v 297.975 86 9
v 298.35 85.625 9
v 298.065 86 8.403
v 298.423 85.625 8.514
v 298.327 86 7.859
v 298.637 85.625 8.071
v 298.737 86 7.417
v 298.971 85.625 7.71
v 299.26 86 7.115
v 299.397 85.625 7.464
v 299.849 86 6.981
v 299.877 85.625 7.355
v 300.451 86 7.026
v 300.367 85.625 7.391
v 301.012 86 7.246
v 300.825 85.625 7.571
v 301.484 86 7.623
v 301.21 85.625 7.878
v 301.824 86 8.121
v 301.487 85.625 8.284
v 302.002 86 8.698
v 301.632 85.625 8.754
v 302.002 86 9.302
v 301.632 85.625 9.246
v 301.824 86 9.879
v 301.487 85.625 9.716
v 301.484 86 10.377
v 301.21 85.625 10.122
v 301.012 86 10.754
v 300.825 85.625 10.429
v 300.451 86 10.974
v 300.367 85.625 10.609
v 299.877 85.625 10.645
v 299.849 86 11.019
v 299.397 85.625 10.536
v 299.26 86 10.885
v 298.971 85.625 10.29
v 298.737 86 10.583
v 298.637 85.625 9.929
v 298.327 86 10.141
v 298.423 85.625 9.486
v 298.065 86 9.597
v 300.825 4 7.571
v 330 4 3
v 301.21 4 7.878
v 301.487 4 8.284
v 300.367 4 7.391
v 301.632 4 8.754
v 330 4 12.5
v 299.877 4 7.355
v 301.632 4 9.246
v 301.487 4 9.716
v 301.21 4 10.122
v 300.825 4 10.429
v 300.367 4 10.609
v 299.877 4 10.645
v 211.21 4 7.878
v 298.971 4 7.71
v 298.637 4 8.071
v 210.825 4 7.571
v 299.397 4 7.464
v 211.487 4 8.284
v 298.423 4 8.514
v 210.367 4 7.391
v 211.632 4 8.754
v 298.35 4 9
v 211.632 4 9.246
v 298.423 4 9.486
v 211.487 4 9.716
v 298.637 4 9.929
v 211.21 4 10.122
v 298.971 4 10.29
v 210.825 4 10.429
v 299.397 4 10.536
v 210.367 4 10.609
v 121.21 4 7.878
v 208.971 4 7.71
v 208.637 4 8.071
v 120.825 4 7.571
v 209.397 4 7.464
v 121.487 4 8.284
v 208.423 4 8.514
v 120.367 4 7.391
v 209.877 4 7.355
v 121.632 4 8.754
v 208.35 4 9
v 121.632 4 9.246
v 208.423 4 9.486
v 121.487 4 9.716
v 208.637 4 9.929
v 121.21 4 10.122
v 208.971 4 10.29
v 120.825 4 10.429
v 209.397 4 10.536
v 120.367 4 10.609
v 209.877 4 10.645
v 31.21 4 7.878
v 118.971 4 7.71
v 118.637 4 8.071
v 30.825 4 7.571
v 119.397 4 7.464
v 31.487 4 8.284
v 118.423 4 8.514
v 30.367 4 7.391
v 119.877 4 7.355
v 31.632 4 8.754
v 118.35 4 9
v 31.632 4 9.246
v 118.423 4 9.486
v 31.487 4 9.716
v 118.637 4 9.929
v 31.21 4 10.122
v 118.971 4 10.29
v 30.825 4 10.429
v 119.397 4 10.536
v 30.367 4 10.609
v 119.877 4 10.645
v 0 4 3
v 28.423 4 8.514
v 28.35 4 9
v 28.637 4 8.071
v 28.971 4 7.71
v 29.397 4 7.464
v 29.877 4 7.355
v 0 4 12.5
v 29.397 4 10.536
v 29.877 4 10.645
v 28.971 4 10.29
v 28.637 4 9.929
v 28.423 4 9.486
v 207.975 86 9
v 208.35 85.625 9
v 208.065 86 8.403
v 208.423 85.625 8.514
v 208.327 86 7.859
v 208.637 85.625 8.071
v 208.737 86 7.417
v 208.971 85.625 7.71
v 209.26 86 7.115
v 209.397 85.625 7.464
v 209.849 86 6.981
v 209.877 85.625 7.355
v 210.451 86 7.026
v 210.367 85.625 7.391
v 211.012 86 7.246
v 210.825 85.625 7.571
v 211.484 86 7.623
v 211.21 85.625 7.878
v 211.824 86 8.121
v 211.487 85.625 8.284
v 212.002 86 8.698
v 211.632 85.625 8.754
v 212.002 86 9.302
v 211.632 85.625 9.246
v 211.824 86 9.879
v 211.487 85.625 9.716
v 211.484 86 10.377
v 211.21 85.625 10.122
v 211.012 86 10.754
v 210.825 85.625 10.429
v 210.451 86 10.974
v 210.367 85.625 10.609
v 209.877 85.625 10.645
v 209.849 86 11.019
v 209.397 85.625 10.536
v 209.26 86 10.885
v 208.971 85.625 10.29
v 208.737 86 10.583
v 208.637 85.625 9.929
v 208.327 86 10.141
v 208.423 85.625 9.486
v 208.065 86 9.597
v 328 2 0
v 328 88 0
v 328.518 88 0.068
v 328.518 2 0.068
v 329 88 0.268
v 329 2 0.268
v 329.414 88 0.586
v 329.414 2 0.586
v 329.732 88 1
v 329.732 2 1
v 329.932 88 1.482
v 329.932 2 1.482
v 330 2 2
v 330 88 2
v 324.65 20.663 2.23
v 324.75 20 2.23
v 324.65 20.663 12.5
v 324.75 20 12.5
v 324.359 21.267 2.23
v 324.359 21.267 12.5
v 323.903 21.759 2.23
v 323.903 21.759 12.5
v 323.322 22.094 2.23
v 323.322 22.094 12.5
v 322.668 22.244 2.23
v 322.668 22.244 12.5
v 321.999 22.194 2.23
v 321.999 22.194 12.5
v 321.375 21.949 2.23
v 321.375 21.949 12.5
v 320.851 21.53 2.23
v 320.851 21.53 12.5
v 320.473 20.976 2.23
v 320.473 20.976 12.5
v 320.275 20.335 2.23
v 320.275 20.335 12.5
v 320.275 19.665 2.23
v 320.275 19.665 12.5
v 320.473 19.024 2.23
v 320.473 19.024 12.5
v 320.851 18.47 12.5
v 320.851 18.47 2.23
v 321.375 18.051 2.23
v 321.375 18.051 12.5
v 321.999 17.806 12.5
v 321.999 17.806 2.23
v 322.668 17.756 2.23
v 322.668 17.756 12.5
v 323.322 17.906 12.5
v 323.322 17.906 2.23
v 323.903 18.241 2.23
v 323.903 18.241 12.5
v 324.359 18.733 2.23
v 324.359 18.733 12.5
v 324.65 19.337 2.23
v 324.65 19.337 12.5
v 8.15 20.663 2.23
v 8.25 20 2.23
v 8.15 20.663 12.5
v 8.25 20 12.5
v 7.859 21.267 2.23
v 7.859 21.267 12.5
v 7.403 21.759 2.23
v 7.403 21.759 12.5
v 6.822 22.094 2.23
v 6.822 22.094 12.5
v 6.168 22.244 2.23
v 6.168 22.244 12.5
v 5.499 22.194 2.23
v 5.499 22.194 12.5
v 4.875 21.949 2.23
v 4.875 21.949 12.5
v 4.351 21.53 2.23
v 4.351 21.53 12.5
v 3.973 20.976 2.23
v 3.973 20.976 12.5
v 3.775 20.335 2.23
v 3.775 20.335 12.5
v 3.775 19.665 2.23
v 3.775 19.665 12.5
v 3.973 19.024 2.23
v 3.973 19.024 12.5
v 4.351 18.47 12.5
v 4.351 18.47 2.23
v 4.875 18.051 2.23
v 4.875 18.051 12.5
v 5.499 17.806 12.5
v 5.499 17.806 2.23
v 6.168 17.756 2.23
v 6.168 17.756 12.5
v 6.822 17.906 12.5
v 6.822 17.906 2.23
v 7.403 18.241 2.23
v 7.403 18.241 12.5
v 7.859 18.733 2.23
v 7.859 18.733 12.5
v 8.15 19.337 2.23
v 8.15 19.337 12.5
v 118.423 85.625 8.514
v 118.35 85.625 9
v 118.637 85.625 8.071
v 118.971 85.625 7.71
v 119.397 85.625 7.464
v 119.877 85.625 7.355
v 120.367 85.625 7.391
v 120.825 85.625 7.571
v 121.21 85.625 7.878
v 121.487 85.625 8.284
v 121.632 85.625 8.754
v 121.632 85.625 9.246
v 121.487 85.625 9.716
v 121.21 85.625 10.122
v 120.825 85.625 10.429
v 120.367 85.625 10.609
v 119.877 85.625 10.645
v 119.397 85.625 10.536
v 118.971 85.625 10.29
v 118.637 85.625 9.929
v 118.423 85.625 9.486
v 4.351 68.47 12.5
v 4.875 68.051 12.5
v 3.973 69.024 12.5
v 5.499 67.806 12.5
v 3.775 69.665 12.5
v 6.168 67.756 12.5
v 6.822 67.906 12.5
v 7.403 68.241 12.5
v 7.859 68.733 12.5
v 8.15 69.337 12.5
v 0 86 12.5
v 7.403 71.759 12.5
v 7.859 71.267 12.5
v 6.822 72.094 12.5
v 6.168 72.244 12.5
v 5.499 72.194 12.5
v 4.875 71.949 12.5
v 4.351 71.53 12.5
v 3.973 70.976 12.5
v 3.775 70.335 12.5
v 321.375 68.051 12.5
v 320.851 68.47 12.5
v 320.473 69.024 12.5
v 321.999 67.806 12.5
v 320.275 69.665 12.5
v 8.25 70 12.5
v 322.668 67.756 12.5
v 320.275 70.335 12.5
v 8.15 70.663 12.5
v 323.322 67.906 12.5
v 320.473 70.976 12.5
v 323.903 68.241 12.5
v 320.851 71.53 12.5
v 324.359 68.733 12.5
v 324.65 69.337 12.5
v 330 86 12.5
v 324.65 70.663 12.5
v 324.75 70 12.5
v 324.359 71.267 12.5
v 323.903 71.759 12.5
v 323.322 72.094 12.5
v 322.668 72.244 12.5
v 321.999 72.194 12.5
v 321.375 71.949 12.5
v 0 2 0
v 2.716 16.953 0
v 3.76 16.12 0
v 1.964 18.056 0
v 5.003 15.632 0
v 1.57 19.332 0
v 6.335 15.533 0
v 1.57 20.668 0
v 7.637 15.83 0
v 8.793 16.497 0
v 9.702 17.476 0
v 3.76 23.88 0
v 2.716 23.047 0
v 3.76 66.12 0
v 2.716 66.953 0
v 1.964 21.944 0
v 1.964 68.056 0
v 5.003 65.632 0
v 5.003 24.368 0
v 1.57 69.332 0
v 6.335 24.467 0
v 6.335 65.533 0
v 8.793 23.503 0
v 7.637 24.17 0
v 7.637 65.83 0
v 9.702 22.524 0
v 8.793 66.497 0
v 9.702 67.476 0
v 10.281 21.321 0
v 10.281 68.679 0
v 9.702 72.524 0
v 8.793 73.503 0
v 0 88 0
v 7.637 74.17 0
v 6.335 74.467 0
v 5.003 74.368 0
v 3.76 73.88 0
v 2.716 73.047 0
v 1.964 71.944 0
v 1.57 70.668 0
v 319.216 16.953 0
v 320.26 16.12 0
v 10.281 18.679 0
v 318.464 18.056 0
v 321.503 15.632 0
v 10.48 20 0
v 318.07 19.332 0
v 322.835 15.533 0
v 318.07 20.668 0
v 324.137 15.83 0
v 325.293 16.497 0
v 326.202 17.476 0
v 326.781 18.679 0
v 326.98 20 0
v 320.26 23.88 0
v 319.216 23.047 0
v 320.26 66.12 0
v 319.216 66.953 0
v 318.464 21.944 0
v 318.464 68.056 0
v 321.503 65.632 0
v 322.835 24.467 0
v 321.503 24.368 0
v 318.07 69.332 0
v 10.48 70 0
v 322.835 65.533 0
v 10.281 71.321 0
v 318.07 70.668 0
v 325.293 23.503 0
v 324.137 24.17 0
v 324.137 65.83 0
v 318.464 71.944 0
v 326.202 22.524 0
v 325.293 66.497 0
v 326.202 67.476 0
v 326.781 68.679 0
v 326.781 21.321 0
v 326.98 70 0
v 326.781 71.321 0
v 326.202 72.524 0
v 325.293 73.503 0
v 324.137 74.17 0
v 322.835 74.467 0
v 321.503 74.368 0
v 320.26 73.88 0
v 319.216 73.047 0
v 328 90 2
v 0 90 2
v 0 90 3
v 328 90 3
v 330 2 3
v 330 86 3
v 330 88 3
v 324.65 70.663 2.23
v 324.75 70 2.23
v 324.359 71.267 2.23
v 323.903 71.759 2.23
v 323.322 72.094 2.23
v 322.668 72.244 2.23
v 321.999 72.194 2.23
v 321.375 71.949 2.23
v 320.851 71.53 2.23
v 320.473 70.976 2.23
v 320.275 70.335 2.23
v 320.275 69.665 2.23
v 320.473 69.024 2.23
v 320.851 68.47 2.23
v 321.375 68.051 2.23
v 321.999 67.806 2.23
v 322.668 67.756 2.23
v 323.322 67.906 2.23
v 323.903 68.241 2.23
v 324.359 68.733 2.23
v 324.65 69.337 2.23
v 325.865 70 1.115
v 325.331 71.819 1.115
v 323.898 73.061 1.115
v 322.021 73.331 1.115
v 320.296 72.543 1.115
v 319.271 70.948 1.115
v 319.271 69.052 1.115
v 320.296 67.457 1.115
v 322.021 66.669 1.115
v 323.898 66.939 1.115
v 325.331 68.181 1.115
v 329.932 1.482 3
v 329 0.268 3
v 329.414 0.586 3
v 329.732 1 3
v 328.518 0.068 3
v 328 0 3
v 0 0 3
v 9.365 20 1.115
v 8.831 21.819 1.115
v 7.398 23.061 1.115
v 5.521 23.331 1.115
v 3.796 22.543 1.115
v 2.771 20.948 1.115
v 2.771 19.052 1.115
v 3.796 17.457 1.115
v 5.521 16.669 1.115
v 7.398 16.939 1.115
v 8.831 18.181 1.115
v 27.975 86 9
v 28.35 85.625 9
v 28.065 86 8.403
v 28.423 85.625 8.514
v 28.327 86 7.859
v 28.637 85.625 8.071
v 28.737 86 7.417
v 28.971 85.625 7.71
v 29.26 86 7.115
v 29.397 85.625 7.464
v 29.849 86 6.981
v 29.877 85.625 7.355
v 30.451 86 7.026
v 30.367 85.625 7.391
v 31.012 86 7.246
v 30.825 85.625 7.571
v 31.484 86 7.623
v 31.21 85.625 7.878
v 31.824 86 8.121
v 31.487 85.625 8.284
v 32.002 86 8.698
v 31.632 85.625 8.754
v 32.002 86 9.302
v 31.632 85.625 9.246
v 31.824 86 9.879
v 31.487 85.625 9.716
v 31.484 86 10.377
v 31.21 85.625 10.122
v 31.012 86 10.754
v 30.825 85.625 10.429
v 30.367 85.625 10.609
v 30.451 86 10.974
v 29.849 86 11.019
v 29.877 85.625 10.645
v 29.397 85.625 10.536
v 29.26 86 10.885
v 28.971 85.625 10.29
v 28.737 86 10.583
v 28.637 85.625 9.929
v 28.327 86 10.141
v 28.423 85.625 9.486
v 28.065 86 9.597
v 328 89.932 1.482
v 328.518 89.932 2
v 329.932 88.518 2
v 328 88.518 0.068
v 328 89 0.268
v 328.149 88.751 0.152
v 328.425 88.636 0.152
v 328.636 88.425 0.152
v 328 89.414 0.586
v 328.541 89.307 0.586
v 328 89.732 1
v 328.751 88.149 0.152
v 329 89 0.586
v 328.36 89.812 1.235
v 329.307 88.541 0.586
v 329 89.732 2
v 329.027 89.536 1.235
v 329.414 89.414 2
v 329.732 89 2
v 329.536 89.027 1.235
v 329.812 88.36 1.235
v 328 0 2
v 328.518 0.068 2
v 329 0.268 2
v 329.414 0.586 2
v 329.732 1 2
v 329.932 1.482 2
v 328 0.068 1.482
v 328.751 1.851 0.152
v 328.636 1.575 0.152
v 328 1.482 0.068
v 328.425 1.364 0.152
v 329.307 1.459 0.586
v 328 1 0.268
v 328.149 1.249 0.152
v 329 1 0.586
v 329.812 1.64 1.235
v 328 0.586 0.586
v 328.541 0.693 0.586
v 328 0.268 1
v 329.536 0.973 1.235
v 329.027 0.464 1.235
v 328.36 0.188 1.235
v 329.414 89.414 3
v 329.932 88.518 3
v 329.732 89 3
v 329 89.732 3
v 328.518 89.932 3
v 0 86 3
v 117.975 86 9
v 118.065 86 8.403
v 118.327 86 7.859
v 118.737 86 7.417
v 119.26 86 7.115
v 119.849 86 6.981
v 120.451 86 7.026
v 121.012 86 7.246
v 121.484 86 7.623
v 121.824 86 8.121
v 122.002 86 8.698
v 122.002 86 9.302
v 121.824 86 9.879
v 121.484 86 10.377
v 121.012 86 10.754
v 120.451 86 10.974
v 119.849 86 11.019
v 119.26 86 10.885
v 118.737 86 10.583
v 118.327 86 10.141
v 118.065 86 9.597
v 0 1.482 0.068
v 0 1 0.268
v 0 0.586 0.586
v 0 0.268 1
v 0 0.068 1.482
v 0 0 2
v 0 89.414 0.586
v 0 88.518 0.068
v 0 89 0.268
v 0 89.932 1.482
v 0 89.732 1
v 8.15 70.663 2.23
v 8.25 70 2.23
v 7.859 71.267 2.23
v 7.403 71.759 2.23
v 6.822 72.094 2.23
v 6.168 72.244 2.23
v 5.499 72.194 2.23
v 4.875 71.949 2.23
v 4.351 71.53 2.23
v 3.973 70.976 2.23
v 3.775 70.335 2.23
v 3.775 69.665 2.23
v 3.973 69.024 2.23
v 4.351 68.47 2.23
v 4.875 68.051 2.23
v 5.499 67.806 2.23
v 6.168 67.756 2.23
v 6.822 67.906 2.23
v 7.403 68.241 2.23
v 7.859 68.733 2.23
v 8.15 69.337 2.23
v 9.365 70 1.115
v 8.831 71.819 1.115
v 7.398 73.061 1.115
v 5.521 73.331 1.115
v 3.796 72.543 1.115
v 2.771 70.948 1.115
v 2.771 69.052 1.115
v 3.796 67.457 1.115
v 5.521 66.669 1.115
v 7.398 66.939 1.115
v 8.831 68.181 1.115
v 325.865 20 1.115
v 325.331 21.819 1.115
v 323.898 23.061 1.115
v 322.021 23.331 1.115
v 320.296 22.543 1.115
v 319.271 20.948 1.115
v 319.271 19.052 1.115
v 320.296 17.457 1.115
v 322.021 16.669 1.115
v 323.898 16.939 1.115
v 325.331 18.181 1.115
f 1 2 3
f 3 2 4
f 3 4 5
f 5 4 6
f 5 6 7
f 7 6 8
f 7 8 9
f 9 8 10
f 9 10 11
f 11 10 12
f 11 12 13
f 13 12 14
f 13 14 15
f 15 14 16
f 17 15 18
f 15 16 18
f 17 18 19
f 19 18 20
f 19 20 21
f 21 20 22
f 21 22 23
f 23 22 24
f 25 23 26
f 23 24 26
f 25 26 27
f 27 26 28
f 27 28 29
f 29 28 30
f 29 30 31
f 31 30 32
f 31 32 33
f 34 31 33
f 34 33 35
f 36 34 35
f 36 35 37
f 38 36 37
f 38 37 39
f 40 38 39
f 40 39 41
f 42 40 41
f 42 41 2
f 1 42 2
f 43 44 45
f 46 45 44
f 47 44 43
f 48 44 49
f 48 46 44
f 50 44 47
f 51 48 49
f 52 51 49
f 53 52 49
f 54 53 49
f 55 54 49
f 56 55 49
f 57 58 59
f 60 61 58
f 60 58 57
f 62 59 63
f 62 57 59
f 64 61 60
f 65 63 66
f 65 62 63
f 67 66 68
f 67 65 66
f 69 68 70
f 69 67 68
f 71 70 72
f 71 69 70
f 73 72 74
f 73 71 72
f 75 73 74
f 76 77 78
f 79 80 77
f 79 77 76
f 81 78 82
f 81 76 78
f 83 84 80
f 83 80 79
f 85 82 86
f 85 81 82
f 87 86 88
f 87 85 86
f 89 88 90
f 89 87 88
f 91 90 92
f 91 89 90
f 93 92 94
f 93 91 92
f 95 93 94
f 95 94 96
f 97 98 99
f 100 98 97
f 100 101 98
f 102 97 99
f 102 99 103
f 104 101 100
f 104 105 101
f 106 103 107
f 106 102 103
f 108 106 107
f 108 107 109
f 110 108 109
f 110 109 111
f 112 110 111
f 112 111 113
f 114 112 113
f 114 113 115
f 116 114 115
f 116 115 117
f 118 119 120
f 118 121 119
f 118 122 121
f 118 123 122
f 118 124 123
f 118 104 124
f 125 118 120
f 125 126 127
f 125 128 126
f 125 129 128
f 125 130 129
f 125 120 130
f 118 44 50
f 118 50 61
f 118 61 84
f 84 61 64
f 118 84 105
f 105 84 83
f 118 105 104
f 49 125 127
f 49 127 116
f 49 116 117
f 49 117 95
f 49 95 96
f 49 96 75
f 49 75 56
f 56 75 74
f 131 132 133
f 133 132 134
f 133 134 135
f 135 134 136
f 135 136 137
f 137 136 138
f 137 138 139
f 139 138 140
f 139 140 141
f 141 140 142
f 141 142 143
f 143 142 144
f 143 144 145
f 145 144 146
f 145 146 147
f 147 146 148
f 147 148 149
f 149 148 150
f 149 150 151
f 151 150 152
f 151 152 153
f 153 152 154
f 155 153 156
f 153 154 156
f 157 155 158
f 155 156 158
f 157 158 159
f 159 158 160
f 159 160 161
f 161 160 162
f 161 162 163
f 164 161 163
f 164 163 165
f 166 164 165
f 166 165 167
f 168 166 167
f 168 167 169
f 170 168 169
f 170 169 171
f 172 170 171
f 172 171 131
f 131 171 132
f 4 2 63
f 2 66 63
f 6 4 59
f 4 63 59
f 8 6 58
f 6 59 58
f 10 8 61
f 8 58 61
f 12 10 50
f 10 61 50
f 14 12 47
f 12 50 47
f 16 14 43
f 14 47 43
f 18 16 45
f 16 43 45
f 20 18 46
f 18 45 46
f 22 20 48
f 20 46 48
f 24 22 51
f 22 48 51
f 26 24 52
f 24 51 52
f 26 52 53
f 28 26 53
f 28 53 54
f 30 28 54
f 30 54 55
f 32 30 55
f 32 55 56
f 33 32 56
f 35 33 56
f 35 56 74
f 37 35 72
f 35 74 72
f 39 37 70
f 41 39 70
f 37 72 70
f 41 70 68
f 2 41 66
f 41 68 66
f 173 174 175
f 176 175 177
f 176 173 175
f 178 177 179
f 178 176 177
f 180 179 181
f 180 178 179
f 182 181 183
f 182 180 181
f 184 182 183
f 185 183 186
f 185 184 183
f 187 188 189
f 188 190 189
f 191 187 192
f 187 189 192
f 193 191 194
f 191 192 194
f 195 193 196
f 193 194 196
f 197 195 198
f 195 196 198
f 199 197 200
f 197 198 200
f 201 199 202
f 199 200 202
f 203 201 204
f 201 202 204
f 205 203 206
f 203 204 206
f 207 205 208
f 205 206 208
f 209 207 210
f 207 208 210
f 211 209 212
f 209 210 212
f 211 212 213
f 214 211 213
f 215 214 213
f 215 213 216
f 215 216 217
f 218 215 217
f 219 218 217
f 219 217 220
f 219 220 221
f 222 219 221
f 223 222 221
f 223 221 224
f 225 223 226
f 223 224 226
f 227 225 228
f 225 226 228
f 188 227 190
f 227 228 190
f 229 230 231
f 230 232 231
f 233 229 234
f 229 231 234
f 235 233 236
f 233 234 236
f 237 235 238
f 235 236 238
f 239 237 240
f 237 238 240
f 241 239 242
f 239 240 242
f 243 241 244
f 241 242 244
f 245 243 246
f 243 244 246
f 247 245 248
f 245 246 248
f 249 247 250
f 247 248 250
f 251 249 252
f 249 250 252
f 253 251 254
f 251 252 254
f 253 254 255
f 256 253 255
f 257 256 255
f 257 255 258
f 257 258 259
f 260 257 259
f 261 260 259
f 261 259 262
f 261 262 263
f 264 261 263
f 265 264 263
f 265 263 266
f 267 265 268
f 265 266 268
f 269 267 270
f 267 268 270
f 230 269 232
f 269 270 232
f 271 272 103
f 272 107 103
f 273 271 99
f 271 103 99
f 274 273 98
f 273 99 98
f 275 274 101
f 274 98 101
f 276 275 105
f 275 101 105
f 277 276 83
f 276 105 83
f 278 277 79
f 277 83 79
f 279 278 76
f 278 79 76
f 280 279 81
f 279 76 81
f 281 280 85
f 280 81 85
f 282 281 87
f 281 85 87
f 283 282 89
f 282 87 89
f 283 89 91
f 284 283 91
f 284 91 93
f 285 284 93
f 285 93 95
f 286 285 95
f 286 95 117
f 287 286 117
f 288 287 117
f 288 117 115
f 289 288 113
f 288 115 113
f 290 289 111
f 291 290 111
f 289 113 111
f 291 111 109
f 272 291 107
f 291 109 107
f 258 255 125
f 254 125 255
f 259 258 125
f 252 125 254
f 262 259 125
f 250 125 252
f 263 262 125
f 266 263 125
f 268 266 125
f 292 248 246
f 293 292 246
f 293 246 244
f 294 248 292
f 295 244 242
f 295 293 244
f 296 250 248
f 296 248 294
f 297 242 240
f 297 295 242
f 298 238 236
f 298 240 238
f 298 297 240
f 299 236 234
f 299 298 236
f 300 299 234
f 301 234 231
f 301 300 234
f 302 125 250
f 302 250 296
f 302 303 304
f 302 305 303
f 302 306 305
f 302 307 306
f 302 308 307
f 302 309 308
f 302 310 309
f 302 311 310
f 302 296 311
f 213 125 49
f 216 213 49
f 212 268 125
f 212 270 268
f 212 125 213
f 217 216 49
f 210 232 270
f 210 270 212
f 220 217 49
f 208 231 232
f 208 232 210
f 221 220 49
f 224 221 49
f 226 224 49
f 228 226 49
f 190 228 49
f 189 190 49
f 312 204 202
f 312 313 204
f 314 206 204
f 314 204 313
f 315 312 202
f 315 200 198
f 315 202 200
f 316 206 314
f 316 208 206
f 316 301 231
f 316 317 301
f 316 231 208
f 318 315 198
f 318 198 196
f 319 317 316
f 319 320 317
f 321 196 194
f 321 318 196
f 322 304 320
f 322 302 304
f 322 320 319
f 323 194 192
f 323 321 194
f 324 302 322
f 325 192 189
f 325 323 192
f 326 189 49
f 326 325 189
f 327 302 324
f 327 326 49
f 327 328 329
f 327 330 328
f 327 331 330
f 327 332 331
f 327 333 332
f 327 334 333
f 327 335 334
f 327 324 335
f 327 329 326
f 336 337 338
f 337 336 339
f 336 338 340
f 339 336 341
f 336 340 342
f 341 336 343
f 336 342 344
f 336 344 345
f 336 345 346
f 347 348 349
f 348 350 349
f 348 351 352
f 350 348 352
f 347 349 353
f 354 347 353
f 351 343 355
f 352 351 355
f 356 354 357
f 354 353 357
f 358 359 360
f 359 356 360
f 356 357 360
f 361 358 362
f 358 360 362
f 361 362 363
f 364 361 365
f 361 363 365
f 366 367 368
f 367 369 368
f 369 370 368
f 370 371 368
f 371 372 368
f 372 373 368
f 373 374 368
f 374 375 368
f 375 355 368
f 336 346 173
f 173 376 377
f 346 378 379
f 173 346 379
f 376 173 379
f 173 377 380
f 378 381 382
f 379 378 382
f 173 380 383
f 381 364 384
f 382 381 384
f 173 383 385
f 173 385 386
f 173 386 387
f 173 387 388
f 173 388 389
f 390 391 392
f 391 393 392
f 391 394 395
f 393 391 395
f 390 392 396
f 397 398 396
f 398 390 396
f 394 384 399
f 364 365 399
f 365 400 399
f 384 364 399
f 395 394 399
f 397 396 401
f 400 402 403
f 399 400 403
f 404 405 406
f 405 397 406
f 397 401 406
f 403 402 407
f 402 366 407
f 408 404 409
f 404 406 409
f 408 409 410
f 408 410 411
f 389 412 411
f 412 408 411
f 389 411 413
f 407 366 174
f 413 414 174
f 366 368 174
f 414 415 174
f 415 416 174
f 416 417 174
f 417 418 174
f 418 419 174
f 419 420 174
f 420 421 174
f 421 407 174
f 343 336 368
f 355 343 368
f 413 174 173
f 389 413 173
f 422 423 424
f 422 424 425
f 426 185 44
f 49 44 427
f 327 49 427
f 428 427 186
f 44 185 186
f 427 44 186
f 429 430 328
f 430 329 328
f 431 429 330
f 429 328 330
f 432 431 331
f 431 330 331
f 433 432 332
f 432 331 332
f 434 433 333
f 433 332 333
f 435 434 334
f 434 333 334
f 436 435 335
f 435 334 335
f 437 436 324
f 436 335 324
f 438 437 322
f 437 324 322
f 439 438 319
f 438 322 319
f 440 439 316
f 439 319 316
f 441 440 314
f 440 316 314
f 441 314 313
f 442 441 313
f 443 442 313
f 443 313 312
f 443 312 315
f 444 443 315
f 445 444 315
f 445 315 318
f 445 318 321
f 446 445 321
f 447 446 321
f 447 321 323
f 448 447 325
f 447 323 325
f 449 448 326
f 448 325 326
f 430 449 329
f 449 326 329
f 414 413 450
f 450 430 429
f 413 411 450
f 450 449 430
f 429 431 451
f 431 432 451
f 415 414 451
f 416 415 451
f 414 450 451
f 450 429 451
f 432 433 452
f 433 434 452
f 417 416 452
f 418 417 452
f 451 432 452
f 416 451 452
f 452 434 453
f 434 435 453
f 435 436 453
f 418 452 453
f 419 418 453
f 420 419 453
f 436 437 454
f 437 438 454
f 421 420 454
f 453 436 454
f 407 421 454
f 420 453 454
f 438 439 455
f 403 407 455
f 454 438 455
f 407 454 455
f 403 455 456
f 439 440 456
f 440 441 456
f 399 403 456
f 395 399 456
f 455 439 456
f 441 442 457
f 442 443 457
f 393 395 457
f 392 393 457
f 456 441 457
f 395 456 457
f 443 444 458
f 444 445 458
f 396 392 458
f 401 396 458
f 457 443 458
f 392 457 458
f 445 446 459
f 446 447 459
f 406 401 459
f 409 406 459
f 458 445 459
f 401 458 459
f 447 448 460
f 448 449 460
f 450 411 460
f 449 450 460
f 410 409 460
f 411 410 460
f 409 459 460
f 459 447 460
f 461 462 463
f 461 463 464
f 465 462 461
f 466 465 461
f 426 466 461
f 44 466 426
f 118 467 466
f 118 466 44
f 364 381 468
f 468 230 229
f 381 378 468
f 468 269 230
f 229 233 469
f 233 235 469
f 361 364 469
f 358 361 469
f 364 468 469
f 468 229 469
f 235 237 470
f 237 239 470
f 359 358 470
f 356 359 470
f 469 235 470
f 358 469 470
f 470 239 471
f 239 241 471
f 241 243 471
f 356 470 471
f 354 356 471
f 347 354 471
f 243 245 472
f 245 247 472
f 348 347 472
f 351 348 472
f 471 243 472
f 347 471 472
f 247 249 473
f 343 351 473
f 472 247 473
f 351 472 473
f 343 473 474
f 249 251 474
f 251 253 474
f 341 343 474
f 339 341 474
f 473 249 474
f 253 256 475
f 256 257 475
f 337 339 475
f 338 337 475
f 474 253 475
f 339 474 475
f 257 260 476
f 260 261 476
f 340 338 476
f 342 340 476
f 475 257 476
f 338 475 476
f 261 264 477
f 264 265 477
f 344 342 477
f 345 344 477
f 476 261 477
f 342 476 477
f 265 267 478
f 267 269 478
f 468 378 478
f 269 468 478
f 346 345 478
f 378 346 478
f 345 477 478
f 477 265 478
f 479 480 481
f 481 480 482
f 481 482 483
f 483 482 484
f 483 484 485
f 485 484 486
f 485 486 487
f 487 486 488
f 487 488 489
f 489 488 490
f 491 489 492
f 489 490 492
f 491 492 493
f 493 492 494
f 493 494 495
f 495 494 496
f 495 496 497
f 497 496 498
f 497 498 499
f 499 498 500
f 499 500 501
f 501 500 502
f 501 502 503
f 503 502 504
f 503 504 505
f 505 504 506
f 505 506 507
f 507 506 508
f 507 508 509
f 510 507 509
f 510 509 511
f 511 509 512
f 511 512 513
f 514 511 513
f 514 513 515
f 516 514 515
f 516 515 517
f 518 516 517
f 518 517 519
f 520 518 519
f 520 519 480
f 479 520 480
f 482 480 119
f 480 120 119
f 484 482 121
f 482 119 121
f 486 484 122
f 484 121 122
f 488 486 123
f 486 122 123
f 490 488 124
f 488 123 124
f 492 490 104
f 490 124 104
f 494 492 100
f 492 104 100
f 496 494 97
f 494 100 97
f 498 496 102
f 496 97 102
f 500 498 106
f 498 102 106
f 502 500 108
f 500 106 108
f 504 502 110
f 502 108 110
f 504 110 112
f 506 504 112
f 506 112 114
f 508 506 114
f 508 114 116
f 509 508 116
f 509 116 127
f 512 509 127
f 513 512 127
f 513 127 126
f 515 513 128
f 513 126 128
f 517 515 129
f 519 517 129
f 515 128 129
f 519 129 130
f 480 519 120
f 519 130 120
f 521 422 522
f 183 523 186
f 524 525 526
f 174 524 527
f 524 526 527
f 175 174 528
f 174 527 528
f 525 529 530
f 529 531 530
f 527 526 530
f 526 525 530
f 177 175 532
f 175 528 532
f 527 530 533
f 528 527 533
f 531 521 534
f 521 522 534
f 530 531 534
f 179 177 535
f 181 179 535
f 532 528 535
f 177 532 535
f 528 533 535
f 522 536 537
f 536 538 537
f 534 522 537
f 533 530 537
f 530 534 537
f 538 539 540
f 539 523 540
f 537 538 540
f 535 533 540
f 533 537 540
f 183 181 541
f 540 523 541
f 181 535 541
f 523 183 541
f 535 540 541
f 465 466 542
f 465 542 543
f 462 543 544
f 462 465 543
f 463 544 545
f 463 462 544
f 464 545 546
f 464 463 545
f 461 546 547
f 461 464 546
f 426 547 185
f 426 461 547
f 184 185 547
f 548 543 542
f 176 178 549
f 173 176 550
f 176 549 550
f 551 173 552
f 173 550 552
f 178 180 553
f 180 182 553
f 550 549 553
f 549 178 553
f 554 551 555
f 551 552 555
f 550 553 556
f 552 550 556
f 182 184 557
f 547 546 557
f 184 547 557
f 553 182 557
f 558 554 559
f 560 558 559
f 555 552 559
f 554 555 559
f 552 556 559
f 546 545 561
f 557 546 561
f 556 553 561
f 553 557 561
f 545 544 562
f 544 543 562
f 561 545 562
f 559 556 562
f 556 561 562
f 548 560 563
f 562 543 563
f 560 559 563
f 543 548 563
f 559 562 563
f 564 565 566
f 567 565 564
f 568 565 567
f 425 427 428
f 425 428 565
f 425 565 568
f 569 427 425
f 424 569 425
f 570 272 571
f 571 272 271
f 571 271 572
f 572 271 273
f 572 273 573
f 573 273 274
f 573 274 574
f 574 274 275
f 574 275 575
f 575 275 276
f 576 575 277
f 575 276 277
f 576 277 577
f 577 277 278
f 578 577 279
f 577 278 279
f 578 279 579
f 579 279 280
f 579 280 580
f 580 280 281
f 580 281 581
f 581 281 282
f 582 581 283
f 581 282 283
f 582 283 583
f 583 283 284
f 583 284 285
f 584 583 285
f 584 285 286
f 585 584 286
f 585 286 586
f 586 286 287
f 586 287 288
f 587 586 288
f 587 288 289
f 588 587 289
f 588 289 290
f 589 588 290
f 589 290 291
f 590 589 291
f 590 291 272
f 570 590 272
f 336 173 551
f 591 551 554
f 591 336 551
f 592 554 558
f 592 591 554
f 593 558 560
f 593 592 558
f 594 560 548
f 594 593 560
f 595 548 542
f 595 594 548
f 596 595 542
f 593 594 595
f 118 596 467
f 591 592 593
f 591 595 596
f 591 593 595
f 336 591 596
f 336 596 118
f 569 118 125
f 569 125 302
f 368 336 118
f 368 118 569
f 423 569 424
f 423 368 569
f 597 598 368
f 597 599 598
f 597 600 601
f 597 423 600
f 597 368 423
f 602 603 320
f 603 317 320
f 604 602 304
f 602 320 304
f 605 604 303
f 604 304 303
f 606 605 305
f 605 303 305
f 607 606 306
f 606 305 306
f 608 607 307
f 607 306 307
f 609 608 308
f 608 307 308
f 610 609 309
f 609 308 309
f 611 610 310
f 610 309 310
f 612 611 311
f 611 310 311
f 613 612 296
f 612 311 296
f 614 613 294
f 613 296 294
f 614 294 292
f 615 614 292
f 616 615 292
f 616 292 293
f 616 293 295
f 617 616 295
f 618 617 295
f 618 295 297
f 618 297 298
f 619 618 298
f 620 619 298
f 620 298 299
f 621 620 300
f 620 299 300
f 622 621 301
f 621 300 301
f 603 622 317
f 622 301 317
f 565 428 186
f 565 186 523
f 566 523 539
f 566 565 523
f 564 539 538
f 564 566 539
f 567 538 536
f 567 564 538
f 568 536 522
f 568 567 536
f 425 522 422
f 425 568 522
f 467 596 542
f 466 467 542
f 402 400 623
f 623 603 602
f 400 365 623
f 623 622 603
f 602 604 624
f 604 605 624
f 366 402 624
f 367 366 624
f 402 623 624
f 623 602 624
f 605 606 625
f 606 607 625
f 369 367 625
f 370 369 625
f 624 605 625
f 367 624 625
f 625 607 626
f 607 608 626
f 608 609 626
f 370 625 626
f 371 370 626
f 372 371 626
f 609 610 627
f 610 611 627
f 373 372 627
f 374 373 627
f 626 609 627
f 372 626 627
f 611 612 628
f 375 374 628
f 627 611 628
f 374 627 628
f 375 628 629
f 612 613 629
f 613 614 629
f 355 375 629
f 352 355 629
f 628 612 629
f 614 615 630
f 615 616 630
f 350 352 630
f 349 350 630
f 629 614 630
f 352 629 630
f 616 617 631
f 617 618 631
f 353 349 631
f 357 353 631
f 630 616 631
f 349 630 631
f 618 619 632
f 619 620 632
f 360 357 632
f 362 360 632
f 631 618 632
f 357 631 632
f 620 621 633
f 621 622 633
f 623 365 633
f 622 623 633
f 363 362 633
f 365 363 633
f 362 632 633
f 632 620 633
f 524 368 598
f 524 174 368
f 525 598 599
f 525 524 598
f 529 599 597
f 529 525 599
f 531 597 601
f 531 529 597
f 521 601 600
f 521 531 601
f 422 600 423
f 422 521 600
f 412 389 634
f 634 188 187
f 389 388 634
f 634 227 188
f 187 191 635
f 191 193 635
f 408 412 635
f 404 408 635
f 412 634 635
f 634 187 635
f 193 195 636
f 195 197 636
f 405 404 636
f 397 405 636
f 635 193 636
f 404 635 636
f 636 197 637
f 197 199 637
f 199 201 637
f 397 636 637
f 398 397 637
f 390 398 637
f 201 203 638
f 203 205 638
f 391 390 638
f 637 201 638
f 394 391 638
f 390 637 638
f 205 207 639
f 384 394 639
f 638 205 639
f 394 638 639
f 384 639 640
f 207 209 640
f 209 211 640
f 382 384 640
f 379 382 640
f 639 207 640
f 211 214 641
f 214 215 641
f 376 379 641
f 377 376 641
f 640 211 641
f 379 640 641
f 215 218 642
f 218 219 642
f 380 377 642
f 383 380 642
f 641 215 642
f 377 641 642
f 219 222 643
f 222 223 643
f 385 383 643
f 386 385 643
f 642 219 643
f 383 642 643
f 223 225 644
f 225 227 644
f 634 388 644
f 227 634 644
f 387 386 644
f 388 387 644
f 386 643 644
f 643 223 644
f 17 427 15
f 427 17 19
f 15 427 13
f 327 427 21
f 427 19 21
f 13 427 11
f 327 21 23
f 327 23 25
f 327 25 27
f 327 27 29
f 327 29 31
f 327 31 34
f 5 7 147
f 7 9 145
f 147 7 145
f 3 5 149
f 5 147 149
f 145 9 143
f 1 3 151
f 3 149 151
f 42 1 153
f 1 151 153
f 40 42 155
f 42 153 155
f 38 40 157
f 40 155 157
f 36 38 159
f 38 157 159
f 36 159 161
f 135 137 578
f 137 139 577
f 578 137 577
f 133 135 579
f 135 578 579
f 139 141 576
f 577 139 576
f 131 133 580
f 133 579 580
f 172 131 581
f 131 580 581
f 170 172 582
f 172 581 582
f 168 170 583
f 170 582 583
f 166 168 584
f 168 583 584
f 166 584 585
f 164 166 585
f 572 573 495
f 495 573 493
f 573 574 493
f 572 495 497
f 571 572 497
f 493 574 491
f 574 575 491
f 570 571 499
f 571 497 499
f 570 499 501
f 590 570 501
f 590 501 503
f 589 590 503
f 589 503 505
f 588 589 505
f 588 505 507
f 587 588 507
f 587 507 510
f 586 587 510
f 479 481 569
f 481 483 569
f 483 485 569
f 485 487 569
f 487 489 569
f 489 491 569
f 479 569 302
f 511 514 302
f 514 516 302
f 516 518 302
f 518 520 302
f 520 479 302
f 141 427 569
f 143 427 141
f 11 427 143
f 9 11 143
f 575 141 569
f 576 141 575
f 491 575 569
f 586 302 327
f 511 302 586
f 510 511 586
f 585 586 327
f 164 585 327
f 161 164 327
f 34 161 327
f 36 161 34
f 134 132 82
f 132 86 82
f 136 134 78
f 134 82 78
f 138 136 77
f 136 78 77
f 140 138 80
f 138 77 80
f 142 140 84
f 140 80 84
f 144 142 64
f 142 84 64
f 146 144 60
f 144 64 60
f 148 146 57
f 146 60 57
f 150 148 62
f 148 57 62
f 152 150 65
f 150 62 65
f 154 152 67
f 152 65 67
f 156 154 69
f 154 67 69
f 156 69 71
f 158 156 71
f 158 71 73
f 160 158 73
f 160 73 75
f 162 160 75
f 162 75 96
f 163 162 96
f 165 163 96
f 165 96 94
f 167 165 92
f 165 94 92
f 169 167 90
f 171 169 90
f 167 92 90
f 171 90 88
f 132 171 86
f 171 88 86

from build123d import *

# Parameters (mm, degrees)
SKETCH_1_W                     = 330
SKETCH_1_H                     = 90
EXTRUDE_1_DEPTH                = 12.5
SKETCH_2_W                     = 9.5
SKETCH_2_H                     = 4
CUT_EXTRUDE_1_DEPTH            = 331
HOLE_WIZARD_M4_1_D             = 4.5
HOLE_WIZARD_M4_1_CSINK_D       = 8.96
HOLE_WIZARD_M4_1_CSINK_ANGLE   = 90
HOLE_WIZARD_M4_1_2_D           = 3.3
HOLE_WIZARD_M4_1_2_CSINK_D     = 4.05
HOLE_WIZARD_M4_1_2_CSINK_ANGLE = 90
FILLET_2_R                     = 2
FILLET_3_R                     = 2


with BuildPart() as part:
    # 草圖1 → 填料-伸長1 (new body)
    with BuildSketch(Plane.XY):
        with Locations((165, 45)):
            Rectangle(SKETCH_1_W, SKETCH_1_H)
    extrude(amount=EXTRUDE_1_DEPTH)

    # 草圖2 → 除料-伸長1 (cut, through all)
    with BuildSketch(Plane.ZY):
        with Locations((7.75, 88)):
            Rectangle(SKETCH_2_W, SKETCH_2_H)
        with Locations((7.75, 2)):
            Rectangle(SKETCH_2_W, SKETCH_2_H)
    extrude(amount=-CUT_EXTRUDE_1_DEPTH, mode=Mode.SUBTRACT)

    # Hole Wizard M4 _1 (through all)
    with Locations(Plane(origin=(0, 0, 0), x_dir=(-1, 0, 0), z_dir=(0, 0, -1))):
        with Locations((-322.5, 70), (-322.5, 20), (-6, 70), (-6, 20)):
            CounterSinkHole(HOLE_WIZARD_M4_1_D / 2, HOLE_WIZARD_M4_1_CSINK_D / 2, counter_sink_angle=HOLE_WIZARD_M4_1_CSINK_ANGLE)

    # Hole Wizard M4 _1 2 (through all)
    with Locations(Plane(origin=(0, 86, 0), x_dir=(1, 0, 0), z_dir=(0, 1, 0))):
        with Locations((30, -9), (120, -9), (210, -9), (300, -9)):
            CounterSinkHole(HOLE_WIZARD_M4_1_2_D / 2, HOLE_WIZARD_M4_1_2_CSINK_D / 2, counter_sink_angle=HOLE_WIZARD_M4_1_2_CSINK_ANGLE)

    # 圓角2
    fillet_2_edges = [part.edges().sort_by_distance(p)[0] for p in [
        (330, 90, 1.5),
        (330, 0, 1.5),
    ]]
    fillet(fillet_2_edges, radius=FILLET_2_R)

    # 圓角3
    fillet_3_edges = [part.edges().sort_by_distance(p)[0] for p in [
        (164, 90, 0),
        (164, 0, 0),
        (330, 45, 0),
    ]]
    fillet(fillet_3_edges, radius=FILLET_3_R)


solid = part.part
